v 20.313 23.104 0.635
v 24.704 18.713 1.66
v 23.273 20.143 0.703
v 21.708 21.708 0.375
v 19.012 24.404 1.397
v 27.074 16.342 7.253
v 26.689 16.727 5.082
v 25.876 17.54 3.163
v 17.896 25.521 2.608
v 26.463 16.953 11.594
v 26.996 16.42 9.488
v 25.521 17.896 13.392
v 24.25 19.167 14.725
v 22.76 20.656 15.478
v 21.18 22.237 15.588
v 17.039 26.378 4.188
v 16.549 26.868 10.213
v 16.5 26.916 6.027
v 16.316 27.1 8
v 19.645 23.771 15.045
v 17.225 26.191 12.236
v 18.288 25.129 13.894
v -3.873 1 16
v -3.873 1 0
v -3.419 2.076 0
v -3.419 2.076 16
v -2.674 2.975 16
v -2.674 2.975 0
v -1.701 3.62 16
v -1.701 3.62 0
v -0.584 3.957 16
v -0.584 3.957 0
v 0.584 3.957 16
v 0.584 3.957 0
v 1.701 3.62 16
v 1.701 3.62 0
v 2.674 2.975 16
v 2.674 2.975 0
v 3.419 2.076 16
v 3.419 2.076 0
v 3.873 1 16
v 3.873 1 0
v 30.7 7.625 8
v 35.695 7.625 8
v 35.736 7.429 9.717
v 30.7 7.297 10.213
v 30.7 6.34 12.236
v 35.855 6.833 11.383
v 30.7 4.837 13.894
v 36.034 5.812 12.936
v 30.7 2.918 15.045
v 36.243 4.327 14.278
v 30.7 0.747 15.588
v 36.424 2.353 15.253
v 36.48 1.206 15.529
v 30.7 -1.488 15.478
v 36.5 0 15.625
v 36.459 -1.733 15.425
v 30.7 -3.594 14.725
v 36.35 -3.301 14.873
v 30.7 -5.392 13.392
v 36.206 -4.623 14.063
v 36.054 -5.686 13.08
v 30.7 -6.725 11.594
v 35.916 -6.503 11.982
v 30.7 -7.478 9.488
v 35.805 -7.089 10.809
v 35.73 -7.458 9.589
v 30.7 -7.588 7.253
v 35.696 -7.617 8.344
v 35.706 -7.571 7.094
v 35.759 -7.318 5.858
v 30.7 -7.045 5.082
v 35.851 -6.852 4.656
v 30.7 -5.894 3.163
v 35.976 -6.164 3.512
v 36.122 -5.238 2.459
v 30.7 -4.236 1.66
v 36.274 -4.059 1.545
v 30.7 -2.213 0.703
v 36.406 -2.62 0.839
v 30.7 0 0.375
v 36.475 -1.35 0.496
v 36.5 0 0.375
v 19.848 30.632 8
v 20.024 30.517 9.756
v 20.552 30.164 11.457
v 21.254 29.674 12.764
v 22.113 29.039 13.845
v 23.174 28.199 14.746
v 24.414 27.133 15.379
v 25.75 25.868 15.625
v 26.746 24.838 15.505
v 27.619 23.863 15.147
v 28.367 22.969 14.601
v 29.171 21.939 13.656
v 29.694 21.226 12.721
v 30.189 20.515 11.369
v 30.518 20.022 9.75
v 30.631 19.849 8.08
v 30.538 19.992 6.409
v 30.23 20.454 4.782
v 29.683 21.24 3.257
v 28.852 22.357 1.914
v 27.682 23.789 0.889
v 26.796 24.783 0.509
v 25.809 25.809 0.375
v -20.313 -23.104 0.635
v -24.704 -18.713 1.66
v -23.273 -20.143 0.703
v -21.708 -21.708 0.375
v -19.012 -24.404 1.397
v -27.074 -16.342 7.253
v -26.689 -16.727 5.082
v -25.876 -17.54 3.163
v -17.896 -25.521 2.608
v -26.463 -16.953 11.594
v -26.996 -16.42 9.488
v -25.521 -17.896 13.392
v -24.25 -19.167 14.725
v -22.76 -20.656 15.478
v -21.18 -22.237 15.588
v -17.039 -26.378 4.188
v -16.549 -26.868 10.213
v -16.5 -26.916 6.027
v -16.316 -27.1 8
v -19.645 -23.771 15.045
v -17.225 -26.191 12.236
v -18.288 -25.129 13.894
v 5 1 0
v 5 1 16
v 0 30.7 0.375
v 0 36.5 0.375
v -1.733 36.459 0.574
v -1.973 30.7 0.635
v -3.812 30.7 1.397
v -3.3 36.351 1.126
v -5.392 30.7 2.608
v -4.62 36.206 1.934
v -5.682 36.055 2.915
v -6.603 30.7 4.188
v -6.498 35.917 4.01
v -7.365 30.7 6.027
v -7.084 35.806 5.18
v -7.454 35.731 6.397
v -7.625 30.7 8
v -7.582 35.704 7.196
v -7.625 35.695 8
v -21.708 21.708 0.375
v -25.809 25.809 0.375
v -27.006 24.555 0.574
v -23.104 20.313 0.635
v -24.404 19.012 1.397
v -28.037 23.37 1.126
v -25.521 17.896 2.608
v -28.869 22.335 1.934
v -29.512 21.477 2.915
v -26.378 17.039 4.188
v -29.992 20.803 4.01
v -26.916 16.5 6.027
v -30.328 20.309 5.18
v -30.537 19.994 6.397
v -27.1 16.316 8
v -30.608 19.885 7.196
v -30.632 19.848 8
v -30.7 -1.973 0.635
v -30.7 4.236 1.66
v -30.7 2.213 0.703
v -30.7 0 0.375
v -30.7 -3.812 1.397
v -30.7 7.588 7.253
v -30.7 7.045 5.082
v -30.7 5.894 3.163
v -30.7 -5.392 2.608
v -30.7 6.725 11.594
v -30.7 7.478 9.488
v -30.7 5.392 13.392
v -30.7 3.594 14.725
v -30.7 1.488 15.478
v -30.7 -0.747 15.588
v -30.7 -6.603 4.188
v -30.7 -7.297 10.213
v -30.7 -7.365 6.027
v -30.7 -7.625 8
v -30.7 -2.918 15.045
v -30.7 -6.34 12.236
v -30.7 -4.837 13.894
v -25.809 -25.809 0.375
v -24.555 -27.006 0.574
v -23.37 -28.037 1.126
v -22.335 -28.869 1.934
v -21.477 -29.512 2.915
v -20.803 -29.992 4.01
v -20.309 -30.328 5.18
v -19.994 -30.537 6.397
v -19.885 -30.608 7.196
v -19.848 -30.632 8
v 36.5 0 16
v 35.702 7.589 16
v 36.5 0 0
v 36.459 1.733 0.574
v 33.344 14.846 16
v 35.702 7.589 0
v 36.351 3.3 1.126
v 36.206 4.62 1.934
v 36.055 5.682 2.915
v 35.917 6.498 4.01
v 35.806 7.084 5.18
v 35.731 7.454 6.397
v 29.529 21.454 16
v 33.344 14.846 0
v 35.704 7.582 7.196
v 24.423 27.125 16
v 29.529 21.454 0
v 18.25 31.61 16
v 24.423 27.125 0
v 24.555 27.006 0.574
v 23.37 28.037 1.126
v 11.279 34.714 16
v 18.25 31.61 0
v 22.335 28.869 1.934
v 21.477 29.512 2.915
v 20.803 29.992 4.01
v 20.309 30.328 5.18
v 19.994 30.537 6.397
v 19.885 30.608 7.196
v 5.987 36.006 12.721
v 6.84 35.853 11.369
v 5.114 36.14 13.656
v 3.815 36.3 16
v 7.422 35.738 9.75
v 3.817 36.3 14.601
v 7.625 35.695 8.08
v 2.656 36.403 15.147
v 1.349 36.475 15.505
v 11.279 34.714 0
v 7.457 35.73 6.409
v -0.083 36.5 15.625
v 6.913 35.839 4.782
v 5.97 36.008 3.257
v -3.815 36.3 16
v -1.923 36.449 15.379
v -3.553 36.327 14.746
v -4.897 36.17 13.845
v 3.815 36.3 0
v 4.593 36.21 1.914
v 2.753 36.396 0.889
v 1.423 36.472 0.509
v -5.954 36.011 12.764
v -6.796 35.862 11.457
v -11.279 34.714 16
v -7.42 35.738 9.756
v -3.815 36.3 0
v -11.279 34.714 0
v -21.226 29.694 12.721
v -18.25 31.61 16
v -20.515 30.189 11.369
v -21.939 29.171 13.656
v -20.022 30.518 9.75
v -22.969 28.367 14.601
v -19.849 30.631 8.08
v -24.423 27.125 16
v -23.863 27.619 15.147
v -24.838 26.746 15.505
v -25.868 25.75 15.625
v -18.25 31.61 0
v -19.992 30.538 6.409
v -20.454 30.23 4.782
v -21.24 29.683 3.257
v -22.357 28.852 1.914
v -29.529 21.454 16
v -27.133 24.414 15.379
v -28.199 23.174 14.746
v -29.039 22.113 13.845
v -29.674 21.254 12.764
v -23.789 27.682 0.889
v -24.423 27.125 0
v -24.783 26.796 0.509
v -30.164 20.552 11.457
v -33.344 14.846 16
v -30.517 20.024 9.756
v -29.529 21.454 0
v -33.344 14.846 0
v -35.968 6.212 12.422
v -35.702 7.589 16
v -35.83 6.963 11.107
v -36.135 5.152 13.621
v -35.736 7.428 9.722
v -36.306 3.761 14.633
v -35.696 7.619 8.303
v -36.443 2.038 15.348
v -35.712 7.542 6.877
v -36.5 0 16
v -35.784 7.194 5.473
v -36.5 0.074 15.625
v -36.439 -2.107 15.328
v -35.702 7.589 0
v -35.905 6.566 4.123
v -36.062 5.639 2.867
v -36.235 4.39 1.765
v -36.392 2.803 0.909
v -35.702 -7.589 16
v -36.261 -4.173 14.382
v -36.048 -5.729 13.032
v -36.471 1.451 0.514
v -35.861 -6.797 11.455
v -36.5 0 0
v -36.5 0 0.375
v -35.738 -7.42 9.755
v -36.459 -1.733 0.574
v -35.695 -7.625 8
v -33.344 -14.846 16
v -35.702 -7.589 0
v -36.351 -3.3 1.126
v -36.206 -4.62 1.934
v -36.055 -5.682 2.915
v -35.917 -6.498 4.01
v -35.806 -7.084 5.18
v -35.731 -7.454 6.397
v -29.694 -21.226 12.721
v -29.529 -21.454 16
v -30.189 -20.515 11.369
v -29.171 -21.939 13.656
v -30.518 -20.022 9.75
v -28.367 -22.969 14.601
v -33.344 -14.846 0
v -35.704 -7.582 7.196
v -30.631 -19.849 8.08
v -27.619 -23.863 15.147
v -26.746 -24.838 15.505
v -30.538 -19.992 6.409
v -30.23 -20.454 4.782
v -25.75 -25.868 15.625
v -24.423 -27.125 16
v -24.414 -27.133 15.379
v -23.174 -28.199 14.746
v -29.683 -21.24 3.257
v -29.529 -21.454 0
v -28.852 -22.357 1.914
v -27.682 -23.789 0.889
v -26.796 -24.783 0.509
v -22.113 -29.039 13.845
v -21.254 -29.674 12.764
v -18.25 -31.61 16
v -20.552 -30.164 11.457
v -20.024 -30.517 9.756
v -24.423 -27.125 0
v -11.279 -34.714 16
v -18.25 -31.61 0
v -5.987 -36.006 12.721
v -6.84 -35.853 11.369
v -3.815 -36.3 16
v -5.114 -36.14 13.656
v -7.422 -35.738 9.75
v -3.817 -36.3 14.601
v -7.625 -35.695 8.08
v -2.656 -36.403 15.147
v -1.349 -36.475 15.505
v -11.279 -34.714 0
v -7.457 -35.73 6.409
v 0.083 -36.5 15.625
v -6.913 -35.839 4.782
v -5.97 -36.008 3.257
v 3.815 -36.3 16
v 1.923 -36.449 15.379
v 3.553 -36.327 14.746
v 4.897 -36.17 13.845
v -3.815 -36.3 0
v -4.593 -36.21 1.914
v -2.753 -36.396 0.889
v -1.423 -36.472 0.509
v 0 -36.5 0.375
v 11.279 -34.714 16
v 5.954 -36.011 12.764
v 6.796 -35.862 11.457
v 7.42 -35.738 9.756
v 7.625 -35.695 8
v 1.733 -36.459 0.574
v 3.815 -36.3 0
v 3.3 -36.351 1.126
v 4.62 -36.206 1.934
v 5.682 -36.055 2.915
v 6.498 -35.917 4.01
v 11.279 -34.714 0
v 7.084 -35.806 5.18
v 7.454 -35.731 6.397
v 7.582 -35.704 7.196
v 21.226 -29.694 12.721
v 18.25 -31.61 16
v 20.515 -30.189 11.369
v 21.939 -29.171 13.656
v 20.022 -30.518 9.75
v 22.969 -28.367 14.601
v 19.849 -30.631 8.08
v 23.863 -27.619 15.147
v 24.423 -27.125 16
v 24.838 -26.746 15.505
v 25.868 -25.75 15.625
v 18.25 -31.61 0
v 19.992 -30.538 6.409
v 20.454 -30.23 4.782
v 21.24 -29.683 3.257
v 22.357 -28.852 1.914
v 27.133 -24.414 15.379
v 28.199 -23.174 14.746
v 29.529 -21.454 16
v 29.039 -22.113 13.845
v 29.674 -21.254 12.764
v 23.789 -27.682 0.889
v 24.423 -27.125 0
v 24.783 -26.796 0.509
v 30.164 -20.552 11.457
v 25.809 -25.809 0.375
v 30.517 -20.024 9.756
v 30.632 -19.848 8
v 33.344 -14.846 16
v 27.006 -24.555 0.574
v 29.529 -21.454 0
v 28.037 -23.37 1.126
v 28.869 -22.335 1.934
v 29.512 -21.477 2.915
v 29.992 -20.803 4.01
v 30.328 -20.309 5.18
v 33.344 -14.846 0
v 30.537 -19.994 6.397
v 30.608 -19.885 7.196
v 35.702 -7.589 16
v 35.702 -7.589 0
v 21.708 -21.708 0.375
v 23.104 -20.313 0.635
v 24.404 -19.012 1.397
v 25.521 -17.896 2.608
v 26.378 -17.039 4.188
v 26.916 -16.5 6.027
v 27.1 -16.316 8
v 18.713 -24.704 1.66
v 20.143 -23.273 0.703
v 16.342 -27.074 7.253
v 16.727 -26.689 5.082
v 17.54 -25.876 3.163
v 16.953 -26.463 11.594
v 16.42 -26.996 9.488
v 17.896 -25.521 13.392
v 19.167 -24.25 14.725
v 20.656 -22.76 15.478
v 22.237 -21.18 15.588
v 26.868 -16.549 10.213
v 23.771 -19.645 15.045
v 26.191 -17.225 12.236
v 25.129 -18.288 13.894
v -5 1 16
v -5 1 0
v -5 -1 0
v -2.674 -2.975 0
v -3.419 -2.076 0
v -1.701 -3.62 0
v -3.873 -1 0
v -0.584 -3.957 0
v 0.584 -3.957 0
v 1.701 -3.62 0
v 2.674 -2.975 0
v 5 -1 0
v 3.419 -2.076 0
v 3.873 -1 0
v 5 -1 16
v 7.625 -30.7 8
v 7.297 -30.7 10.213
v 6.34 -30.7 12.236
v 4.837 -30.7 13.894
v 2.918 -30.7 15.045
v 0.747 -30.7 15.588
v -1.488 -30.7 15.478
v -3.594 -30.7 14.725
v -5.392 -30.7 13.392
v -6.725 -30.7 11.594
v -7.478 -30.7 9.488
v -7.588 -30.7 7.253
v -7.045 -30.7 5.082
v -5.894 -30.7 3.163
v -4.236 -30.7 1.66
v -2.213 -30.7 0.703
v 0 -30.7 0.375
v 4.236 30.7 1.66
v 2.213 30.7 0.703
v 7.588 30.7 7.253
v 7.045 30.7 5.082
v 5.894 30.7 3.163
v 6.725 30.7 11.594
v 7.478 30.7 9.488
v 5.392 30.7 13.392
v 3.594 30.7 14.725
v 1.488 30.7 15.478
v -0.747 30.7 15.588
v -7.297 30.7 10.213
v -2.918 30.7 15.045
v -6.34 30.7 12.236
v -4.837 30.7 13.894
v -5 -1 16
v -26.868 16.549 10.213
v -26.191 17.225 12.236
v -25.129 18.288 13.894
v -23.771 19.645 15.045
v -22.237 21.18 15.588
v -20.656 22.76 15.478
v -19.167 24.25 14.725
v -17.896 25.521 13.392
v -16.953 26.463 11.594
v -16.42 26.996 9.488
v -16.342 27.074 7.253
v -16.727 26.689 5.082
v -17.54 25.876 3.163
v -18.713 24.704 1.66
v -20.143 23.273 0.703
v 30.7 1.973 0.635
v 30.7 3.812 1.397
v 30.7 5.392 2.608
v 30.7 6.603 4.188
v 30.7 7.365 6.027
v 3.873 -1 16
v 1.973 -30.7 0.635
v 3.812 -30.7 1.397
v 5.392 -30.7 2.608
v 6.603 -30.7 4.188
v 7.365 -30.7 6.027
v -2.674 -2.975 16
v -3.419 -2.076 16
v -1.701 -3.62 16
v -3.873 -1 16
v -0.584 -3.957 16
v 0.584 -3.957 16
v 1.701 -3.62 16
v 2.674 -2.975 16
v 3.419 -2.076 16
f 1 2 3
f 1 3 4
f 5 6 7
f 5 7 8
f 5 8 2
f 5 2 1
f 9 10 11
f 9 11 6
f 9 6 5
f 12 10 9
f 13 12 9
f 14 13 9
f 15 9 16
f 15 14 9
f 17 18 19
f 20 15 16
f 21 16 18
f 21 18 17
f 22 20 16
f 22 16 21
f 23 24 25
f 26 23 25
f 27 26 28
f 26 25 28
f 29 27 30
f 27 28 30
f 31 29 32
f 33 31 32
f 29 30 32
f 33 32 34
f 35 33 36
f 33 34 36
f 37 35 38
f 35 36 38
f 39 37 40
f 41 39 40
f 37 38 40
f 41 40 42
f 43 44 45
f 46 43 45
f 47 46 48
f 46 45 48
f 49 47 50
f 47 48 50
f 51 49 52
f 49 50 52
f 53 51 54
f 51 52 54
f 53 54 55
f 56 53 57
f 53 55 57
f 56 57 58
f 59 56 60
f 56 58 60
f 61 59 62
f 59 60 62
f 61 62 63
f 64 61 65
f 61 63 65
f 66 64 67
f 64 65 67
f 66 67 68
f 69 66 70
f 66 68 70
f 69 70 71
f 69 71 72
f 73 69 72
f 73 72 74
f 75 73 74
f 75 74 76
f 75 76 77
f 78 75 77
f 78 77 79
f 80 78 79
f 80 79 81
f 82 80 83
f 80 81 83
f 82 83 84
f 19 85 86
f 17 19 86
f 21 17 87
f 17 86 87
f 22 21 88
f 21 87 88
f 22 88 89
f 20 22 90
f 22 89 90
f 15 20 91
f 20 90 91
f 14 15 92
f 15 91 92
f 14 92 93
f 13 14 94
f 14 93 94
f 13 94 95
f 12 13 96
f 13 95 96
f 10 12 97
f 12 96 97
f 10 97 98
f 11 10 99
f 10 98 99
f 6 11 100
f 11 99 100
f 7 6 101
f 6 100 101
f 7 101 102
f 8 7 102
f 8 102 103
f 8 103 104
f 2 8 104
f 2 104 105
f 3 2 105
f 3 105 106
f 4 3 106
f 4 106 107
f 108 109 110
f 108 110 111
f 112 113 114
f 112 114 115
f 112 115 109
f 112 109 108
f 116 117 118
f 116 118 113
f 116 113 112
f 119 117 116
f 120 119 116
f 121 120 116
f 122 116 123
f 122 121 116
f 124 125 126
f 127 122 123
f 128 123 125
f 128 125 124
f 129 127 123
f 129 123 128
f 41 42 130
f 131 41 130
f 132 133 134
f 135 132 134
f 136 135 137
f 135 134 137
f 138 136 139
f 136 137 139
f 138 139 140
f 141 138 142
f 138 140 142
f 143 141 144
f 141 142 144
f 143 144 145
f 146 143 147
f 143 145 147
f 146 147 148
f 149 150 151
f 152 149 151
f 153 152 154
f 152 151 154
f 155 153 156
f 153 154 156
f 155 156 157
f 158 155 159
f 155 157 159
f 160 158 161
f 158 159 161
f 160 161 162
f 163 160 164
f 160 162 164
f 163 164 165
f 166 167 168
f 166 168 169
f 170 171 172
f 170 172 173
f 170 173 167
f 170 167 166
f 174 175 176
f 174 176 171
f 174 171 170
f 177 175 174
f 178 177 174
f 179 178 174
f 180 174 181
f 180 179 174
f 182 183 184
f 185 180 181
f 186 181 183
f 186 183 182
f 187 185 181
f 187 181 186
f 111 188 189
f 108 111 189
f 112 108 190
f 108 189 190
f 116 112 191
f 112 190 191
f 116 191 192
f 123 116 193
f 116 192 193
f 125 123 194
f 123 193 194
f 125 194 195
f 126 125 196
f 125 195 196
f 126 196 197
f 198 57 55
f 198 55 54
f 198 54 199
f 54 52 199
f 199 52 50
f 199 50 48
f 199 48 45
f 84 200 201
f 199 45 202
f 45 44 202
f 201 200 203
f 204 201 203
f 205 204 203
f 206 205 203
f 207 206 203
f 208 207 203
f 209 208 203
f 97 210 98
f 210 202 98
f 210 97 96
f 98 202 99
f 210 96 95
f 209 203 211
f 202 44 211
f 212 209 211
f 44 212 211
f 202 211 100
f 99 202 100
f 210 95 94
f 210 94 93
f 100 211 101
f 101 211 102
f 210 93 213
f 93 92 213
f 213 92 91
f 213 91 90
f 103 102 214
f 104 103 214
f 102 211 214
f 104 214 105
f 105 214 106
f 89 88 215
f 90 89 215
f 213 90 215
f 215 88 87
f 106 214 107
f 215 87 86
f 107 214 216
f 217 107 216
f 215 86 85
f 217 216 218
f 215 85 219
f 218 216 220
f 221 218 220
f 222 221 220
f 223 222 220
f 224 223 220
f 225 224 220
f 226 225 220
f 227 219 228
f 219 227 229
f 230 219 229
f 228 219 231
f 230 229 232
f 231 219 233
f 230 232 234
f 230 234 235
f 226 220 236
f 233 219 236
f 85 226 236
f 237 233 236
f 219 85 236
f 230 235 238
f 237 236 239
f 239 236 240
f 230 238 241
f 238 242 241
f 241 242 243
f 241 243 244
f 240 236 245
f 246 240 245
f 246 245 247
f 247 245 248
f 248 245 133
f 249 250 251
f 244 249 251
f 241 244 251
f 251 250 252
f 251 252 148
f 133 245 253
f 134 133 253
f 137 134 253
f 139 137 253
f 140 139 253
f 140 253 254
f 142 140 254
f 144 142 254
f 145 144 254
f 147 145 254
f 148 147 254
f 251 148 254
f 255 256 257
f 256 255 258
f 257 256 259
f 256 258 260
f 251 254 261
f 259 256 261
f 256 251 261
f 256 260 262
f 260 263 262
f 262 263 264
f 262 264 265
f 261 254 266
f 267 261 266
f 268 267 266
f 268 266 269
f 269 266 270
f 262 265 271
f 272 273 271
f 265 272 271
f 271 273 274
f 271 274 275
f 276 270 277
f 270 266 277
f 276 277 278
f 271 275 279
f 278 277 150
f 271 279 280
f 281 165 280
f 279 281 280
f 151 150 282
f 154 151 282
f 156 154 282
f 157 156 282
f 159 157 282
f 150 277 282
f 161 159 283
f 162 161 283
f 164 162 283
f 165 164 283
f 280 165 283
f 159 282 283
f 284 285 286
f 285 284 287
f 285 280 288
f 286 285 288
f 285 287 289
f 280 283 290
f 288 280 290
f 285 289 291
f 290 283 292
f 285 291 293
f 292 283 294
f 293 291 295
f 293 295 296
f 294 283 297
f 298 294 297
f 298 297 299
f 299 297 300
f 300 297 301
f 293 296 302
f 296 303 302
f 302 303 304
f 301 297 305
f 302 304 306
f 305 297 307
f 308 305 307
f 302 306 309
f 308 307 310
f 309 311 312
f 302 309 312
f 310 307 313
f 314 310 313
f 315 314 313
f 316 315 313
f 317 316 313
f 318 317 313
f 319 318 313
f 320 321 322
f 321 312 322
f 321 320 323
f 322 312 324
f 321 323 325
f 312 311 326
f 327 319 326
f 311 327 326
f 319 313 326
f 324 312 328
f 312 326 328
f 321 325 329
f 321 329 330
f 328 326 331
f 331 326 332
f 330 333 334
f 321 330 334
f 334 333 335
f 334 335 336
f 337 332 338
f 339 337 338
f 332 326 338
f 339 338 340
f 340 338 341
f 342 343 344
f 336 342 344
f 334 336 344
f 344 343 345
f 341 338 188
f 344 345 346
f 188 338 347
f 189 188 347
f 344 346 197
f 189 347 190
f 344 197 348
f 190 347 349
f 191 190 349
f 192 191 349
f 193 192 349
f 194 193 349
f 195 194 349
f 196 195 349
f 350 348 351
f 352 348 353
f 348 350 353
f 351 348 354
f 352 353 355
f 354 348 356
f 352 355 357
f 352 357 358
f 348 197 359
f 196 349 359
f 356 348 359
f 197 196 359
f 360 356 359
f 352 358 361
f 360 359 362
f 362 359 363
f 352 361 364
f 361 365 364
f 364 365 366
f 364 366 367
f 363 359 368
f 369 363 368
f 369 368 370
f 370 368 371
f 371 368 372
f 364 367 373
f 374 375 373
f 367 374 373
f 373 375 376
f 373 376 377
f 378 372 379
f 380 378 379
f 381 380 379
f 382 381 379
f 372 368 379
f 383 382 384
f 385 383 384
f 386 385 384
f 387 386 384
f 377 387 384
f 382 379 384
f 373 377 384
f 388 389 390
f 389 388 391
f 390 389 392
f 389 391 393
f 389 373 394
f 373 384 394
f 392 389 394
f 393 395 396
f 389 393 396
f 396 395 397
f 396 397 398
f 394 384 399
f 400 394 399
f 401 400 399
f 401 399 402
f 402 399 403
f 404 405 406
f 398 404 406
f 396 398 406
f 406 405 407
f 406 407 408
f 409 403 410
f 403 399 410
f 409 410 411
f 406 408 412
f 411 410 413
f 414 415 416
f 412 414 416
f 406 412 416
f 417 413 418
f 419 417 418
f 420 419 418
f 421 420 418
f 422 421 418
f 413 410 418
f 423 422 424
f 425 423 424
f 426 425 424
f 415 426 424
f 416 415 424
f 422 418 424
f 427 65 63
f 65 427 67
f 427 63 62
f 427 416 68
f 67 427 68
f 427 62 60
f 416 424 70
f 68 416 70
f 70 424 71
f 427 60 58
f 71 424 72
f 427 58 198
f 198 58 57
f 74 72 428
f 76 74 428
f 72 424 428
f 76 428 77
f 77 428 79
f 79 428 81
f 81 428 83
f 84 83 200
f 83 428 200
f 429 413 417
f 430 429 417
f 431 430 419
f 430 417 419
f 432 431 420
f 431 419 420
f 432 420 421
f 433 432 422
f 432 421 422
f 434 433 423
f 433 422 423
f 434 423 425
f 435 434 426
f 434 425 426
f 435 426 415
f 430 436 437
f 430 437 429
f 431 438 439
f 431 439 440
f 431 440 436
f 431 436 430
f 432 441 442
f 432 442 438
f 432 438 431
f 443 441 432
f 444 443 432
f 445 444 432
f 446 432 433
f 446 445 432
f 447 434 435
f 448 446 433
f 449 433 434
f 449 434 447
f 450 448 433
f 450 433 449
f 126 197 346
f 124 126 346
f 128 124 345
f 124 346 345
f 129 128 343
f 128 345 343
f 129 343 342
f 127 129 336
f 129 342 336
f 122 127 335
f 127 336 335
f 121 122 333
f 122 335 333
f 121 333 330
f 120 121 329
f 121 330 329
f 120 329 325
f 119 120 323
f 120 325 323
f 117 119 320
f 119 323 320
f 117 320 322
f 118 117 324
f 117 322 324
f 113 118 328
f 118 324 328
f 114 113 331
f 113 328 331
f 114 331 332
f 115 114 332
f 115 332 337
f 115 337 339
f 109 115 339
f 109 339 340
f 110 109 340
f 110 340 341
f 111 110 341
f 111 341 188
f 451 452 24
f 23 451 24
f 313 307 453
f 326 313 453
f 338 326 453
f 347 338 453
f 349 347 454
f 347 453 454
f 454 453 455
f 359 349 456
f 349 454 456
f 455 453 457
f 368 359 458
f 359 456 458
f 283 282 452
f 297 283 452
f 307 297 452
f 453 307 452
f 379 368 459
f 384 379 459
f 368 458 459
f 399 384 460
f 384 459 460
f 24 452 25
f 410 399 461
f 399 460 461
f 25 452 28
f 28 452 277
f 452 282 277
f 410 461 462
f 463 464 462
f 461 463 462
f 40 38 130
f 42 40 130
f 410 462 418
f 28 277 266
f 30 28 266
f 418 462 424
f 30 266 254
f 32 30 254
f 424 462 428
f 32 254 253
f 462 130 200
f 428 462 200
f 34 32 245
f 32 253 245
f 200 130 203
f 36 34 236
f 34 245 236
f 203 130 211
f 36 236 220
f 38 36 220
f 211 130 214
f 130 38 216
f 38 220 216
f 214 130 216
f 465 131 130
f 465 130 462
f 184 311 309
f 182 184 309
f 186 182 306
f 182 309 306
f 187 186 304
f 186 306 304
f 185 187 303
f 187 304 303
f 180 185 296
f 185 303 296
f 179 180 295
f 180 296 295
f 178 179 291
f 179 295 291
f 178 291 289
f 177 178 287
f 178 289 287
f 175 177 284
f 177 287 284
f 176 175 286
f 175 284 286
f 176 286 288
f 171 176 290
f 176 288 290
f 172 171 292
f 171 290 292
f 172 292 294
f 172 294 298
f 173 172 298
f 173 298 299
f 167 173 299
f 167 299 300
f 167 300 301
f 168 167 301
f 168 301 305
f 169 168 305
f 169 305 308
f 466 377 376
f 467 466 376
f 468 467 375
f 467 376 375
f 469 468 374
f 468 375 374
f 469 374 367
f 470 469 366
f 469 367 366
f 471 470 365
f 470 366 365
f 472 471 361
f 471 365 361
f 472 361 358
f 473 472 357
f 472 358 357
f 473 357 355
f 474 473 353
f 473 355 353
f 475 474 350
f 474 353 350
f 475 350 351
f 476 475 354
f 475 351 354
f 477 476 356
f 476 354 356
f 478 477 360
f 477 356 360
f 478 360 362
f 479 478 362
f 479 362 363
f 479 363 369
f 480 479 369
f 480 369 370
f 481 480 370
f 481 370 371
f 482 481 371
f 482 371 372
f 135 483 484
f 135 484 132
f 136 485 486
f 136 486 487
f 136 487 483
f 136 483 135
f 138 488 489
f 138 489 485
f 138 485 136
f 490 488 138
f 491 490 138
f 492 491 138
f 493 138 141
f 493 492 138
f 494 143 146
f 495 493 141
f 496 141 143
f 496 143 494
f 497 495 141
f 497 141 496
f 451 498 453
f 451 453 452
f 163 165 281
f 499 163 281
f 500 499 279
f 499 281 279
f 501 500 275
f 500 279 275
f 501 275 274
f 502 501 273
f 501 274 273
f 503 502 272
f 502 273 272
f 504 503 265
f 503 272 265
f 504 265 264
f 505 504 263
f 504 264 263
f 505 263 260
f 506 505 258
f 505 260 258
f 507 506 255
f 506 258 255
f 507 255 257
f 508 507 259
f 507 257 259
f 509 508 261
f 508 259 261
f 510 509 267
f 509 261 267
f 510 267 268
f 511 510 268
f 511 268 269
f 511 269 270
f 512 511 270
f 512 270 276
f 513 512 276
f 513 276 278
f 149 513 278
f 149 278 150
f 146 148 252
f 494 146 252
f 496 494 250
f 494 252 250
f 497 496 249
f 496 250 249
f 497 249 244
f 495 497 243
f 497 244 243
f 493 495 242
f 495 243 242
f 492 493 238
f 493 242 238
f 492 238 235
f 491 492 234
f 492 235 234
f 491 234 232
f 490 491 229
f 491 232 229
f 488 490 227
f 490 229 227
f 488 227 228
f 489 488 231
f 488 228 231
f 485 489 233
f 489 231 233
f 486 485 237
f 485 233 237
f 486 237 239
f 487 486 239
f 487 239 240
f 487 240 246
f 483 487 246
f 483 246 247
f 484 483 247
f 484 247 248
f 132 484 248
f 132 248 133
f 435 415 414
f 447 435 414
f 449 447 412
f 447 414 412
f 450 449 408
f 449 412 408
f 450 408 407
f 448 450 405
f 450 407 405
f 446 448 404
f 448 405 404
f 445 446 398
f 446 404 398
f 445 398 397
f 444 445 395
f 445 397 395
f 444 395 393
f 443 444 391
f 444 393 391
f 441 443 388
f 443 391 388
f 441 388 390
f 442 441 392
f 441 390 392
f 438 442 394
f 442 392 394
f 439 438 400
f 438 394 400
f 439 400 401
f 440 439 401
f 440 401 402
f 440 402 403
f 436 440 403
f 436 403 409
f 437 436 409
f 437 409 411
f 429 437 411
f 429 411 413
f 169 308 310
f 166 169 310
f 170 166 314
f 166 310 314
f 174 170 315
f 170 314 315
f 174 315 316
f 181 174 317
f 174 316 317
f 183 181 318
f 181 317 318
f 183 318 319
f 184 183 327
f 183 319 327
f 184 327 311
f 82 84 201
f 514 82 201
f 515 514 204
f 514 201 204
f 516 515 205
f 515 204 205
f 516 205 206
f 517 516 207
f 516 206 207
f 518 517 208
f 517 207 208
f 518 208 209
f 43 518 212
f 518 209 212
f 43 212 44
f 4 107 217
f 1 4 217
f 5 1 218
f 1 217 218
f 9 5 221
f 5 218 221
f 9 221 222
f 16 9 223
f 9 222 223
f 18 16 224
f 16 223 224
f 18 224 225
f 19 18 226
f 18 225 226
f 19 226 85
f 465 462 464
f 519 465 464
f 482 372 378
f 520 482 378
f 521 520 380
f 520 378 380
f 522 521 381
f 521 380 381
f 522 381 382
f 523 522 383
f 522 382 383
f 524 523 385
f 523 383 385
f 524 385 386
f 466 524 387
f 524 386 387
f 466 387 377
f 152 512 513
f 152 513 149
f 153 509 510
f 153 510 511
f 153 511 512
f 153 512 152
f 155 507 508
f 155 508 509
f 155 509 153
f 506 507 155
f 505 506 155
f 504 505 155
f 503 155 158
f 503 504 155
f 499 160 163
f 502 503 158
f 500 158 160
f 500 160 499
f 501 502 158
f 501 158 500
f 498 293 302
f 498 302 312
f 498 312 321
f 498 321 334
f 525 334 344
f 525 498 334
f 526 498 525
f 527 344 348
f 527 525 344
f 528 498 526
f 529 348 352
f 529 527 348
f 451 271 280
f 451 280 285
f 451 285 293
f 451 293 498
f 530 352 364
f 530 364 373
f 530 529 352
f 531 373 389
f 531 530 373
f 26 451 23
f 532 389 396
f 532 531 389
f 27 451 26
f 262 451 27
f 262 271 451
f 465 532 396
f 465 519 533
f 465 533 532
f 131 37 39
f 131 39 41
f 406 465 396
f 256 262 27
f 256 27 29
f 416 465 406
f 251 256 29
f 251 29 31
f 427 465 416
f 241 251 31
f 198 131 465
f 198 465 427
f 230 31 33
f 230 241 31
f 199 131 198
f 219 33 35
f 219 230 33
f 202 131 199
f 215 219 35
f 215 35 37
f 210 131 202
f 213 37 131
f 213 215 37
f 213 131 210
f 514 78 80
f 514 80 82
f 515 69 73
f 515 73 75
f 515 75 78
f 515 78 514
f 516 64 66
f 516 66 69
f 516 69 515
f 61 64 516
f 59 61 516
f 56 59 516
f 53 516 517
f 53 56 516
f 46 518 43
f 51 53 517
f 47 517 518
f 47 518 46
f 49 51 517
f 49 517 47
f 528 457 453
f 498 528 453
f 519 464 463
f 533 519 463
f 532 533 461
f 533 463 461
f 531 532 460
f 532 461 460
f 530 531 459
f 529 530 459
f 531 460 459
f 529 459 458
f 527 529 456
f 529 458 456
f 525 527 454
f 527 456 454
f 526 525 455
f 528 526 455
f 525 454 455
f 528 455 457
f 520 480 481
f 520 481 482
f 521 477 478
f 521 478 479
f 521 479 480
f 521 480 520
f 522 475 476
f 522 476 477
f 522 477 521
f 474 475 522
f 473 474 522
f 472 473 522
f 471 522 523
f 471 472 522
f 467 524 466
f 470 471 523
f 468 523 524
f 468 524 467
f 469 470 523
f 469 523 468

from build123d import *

# Parameters (mm, degrees)
F0_R          = 36.5
F1_DEPTH      = 16
F5_DEPTH      = 6.3
F5_DEPTH_BACK = 2
F6_COUNT      = 8


with BuildPart() as f1:
    # F0 (on Top) → F1 (new body)
    with BuildSketch(Plane.XY):
        Circle(F0_R)
        with BuildLine():
            ThreePointArc((-3.872983, 1), (0, 4), (3.872983, 1))
            Line((3.872983, 1), (5, 1))
            Line((5, 1), (5, -1))
            Line((5, -1), (3.872983, -1))
            ThreePointArc((3.872983, -1), (0, -4), (-3.872983, -1))
            Line((-3.872983, -1), (-5, -1))
            Line((-5, -1), (-5, 1))
            Line((-5, 1), (-3.872983, 1))
        make_face(mode=Mode.SUBTRACT)
    extrude(amount=F1_DEPTH)


with BuildPart() as f5:
    # F3 (on offset) → F5 (new body, two sides)
    with BuildSketch(Plane.XZ.offset(37)) as f5_sk:
        with BuildLine():
            ThreePointArc((0, 0.375), (5.391689, 2.608311), (7.625, 8))
            ThreePointArc((7.625, 8), (-5.391689, 13.391689), (0, 0.375))
        make_face()
    extrude(amount=-F5_DEPTH)
    extrude(f5_sk.sketch, amount=-F5_DEPTH_BACK)


with BuildPart() as f6_1:
    # F6: instance of F5
    add(f5.part.rotate(Axis((0, 0, 8), (0, 0, 1)), 1 * 360 / F6_COUNT))


with BuildPart() as f6_2:
    # F6: instance of F5
    add(f5.part.rotate(Axis((0, 0, 8), (0, 0, 1)), 2 * 360 / F6_COUNT))


with BuildPart() as f6_3:
    # F6: instance of F5
    add(f5.part.rotate(Axis((0, 0, 8), (0, 0, 1)), 3 * 360 / F6_COUNT))


with BuildPart() as f6_4:
    # F6: instance of F5
    add(f5.part.rotate(Axis((0, 0, 8), (0, 0, 1)), 4 * 360 / F6_COUNT))


with BuildPart() as f6_5:
    # F6: instance of F5
    add(f5.part.rotate(Axis((0, 0, 8), (0, 0, 1)), 5 * 360 / F6_COUNT))


with BuildPart() as f6_6:
    # F6: instance of F5
    add(f5.part.rotate(Axis((0, 0, 8), (0, 0, 1)), 6 * 360 / F6_COUNT))


with BuildPart() as f6_7:
    # F6: instance of F5
    add(f5.part.rotate(Axis((0, 0, 8), (0, 0, 1)), 7 * 360 / F6_COUNT))


with BuildPart() as f1_1:
    add(f1.part)

    # F7: cut F5, F6_1, F6_2, F6_3, F6_4, F6_5, F6_6, F6_7
    add(f5.part, mode=Mode.SUBTRACT)
    add(f6_1.part, mode=Mode.SUBTRACT)
    add(f6_2.part, mode=Mode.SUBTRACT)
    add(f6_3.part, mode=Mode.SUBTRACT)
    add(f6_4.part, mode=Mode.SUBTRACT)
    add(f6_5.part, mode=Mode.SUBTRACT)
    add(f6_6.part, mode=Mode.SUBTRACT)
    add(f6_7.part, mode=Mode.SUBTRACT)


solid = f1_1.part
